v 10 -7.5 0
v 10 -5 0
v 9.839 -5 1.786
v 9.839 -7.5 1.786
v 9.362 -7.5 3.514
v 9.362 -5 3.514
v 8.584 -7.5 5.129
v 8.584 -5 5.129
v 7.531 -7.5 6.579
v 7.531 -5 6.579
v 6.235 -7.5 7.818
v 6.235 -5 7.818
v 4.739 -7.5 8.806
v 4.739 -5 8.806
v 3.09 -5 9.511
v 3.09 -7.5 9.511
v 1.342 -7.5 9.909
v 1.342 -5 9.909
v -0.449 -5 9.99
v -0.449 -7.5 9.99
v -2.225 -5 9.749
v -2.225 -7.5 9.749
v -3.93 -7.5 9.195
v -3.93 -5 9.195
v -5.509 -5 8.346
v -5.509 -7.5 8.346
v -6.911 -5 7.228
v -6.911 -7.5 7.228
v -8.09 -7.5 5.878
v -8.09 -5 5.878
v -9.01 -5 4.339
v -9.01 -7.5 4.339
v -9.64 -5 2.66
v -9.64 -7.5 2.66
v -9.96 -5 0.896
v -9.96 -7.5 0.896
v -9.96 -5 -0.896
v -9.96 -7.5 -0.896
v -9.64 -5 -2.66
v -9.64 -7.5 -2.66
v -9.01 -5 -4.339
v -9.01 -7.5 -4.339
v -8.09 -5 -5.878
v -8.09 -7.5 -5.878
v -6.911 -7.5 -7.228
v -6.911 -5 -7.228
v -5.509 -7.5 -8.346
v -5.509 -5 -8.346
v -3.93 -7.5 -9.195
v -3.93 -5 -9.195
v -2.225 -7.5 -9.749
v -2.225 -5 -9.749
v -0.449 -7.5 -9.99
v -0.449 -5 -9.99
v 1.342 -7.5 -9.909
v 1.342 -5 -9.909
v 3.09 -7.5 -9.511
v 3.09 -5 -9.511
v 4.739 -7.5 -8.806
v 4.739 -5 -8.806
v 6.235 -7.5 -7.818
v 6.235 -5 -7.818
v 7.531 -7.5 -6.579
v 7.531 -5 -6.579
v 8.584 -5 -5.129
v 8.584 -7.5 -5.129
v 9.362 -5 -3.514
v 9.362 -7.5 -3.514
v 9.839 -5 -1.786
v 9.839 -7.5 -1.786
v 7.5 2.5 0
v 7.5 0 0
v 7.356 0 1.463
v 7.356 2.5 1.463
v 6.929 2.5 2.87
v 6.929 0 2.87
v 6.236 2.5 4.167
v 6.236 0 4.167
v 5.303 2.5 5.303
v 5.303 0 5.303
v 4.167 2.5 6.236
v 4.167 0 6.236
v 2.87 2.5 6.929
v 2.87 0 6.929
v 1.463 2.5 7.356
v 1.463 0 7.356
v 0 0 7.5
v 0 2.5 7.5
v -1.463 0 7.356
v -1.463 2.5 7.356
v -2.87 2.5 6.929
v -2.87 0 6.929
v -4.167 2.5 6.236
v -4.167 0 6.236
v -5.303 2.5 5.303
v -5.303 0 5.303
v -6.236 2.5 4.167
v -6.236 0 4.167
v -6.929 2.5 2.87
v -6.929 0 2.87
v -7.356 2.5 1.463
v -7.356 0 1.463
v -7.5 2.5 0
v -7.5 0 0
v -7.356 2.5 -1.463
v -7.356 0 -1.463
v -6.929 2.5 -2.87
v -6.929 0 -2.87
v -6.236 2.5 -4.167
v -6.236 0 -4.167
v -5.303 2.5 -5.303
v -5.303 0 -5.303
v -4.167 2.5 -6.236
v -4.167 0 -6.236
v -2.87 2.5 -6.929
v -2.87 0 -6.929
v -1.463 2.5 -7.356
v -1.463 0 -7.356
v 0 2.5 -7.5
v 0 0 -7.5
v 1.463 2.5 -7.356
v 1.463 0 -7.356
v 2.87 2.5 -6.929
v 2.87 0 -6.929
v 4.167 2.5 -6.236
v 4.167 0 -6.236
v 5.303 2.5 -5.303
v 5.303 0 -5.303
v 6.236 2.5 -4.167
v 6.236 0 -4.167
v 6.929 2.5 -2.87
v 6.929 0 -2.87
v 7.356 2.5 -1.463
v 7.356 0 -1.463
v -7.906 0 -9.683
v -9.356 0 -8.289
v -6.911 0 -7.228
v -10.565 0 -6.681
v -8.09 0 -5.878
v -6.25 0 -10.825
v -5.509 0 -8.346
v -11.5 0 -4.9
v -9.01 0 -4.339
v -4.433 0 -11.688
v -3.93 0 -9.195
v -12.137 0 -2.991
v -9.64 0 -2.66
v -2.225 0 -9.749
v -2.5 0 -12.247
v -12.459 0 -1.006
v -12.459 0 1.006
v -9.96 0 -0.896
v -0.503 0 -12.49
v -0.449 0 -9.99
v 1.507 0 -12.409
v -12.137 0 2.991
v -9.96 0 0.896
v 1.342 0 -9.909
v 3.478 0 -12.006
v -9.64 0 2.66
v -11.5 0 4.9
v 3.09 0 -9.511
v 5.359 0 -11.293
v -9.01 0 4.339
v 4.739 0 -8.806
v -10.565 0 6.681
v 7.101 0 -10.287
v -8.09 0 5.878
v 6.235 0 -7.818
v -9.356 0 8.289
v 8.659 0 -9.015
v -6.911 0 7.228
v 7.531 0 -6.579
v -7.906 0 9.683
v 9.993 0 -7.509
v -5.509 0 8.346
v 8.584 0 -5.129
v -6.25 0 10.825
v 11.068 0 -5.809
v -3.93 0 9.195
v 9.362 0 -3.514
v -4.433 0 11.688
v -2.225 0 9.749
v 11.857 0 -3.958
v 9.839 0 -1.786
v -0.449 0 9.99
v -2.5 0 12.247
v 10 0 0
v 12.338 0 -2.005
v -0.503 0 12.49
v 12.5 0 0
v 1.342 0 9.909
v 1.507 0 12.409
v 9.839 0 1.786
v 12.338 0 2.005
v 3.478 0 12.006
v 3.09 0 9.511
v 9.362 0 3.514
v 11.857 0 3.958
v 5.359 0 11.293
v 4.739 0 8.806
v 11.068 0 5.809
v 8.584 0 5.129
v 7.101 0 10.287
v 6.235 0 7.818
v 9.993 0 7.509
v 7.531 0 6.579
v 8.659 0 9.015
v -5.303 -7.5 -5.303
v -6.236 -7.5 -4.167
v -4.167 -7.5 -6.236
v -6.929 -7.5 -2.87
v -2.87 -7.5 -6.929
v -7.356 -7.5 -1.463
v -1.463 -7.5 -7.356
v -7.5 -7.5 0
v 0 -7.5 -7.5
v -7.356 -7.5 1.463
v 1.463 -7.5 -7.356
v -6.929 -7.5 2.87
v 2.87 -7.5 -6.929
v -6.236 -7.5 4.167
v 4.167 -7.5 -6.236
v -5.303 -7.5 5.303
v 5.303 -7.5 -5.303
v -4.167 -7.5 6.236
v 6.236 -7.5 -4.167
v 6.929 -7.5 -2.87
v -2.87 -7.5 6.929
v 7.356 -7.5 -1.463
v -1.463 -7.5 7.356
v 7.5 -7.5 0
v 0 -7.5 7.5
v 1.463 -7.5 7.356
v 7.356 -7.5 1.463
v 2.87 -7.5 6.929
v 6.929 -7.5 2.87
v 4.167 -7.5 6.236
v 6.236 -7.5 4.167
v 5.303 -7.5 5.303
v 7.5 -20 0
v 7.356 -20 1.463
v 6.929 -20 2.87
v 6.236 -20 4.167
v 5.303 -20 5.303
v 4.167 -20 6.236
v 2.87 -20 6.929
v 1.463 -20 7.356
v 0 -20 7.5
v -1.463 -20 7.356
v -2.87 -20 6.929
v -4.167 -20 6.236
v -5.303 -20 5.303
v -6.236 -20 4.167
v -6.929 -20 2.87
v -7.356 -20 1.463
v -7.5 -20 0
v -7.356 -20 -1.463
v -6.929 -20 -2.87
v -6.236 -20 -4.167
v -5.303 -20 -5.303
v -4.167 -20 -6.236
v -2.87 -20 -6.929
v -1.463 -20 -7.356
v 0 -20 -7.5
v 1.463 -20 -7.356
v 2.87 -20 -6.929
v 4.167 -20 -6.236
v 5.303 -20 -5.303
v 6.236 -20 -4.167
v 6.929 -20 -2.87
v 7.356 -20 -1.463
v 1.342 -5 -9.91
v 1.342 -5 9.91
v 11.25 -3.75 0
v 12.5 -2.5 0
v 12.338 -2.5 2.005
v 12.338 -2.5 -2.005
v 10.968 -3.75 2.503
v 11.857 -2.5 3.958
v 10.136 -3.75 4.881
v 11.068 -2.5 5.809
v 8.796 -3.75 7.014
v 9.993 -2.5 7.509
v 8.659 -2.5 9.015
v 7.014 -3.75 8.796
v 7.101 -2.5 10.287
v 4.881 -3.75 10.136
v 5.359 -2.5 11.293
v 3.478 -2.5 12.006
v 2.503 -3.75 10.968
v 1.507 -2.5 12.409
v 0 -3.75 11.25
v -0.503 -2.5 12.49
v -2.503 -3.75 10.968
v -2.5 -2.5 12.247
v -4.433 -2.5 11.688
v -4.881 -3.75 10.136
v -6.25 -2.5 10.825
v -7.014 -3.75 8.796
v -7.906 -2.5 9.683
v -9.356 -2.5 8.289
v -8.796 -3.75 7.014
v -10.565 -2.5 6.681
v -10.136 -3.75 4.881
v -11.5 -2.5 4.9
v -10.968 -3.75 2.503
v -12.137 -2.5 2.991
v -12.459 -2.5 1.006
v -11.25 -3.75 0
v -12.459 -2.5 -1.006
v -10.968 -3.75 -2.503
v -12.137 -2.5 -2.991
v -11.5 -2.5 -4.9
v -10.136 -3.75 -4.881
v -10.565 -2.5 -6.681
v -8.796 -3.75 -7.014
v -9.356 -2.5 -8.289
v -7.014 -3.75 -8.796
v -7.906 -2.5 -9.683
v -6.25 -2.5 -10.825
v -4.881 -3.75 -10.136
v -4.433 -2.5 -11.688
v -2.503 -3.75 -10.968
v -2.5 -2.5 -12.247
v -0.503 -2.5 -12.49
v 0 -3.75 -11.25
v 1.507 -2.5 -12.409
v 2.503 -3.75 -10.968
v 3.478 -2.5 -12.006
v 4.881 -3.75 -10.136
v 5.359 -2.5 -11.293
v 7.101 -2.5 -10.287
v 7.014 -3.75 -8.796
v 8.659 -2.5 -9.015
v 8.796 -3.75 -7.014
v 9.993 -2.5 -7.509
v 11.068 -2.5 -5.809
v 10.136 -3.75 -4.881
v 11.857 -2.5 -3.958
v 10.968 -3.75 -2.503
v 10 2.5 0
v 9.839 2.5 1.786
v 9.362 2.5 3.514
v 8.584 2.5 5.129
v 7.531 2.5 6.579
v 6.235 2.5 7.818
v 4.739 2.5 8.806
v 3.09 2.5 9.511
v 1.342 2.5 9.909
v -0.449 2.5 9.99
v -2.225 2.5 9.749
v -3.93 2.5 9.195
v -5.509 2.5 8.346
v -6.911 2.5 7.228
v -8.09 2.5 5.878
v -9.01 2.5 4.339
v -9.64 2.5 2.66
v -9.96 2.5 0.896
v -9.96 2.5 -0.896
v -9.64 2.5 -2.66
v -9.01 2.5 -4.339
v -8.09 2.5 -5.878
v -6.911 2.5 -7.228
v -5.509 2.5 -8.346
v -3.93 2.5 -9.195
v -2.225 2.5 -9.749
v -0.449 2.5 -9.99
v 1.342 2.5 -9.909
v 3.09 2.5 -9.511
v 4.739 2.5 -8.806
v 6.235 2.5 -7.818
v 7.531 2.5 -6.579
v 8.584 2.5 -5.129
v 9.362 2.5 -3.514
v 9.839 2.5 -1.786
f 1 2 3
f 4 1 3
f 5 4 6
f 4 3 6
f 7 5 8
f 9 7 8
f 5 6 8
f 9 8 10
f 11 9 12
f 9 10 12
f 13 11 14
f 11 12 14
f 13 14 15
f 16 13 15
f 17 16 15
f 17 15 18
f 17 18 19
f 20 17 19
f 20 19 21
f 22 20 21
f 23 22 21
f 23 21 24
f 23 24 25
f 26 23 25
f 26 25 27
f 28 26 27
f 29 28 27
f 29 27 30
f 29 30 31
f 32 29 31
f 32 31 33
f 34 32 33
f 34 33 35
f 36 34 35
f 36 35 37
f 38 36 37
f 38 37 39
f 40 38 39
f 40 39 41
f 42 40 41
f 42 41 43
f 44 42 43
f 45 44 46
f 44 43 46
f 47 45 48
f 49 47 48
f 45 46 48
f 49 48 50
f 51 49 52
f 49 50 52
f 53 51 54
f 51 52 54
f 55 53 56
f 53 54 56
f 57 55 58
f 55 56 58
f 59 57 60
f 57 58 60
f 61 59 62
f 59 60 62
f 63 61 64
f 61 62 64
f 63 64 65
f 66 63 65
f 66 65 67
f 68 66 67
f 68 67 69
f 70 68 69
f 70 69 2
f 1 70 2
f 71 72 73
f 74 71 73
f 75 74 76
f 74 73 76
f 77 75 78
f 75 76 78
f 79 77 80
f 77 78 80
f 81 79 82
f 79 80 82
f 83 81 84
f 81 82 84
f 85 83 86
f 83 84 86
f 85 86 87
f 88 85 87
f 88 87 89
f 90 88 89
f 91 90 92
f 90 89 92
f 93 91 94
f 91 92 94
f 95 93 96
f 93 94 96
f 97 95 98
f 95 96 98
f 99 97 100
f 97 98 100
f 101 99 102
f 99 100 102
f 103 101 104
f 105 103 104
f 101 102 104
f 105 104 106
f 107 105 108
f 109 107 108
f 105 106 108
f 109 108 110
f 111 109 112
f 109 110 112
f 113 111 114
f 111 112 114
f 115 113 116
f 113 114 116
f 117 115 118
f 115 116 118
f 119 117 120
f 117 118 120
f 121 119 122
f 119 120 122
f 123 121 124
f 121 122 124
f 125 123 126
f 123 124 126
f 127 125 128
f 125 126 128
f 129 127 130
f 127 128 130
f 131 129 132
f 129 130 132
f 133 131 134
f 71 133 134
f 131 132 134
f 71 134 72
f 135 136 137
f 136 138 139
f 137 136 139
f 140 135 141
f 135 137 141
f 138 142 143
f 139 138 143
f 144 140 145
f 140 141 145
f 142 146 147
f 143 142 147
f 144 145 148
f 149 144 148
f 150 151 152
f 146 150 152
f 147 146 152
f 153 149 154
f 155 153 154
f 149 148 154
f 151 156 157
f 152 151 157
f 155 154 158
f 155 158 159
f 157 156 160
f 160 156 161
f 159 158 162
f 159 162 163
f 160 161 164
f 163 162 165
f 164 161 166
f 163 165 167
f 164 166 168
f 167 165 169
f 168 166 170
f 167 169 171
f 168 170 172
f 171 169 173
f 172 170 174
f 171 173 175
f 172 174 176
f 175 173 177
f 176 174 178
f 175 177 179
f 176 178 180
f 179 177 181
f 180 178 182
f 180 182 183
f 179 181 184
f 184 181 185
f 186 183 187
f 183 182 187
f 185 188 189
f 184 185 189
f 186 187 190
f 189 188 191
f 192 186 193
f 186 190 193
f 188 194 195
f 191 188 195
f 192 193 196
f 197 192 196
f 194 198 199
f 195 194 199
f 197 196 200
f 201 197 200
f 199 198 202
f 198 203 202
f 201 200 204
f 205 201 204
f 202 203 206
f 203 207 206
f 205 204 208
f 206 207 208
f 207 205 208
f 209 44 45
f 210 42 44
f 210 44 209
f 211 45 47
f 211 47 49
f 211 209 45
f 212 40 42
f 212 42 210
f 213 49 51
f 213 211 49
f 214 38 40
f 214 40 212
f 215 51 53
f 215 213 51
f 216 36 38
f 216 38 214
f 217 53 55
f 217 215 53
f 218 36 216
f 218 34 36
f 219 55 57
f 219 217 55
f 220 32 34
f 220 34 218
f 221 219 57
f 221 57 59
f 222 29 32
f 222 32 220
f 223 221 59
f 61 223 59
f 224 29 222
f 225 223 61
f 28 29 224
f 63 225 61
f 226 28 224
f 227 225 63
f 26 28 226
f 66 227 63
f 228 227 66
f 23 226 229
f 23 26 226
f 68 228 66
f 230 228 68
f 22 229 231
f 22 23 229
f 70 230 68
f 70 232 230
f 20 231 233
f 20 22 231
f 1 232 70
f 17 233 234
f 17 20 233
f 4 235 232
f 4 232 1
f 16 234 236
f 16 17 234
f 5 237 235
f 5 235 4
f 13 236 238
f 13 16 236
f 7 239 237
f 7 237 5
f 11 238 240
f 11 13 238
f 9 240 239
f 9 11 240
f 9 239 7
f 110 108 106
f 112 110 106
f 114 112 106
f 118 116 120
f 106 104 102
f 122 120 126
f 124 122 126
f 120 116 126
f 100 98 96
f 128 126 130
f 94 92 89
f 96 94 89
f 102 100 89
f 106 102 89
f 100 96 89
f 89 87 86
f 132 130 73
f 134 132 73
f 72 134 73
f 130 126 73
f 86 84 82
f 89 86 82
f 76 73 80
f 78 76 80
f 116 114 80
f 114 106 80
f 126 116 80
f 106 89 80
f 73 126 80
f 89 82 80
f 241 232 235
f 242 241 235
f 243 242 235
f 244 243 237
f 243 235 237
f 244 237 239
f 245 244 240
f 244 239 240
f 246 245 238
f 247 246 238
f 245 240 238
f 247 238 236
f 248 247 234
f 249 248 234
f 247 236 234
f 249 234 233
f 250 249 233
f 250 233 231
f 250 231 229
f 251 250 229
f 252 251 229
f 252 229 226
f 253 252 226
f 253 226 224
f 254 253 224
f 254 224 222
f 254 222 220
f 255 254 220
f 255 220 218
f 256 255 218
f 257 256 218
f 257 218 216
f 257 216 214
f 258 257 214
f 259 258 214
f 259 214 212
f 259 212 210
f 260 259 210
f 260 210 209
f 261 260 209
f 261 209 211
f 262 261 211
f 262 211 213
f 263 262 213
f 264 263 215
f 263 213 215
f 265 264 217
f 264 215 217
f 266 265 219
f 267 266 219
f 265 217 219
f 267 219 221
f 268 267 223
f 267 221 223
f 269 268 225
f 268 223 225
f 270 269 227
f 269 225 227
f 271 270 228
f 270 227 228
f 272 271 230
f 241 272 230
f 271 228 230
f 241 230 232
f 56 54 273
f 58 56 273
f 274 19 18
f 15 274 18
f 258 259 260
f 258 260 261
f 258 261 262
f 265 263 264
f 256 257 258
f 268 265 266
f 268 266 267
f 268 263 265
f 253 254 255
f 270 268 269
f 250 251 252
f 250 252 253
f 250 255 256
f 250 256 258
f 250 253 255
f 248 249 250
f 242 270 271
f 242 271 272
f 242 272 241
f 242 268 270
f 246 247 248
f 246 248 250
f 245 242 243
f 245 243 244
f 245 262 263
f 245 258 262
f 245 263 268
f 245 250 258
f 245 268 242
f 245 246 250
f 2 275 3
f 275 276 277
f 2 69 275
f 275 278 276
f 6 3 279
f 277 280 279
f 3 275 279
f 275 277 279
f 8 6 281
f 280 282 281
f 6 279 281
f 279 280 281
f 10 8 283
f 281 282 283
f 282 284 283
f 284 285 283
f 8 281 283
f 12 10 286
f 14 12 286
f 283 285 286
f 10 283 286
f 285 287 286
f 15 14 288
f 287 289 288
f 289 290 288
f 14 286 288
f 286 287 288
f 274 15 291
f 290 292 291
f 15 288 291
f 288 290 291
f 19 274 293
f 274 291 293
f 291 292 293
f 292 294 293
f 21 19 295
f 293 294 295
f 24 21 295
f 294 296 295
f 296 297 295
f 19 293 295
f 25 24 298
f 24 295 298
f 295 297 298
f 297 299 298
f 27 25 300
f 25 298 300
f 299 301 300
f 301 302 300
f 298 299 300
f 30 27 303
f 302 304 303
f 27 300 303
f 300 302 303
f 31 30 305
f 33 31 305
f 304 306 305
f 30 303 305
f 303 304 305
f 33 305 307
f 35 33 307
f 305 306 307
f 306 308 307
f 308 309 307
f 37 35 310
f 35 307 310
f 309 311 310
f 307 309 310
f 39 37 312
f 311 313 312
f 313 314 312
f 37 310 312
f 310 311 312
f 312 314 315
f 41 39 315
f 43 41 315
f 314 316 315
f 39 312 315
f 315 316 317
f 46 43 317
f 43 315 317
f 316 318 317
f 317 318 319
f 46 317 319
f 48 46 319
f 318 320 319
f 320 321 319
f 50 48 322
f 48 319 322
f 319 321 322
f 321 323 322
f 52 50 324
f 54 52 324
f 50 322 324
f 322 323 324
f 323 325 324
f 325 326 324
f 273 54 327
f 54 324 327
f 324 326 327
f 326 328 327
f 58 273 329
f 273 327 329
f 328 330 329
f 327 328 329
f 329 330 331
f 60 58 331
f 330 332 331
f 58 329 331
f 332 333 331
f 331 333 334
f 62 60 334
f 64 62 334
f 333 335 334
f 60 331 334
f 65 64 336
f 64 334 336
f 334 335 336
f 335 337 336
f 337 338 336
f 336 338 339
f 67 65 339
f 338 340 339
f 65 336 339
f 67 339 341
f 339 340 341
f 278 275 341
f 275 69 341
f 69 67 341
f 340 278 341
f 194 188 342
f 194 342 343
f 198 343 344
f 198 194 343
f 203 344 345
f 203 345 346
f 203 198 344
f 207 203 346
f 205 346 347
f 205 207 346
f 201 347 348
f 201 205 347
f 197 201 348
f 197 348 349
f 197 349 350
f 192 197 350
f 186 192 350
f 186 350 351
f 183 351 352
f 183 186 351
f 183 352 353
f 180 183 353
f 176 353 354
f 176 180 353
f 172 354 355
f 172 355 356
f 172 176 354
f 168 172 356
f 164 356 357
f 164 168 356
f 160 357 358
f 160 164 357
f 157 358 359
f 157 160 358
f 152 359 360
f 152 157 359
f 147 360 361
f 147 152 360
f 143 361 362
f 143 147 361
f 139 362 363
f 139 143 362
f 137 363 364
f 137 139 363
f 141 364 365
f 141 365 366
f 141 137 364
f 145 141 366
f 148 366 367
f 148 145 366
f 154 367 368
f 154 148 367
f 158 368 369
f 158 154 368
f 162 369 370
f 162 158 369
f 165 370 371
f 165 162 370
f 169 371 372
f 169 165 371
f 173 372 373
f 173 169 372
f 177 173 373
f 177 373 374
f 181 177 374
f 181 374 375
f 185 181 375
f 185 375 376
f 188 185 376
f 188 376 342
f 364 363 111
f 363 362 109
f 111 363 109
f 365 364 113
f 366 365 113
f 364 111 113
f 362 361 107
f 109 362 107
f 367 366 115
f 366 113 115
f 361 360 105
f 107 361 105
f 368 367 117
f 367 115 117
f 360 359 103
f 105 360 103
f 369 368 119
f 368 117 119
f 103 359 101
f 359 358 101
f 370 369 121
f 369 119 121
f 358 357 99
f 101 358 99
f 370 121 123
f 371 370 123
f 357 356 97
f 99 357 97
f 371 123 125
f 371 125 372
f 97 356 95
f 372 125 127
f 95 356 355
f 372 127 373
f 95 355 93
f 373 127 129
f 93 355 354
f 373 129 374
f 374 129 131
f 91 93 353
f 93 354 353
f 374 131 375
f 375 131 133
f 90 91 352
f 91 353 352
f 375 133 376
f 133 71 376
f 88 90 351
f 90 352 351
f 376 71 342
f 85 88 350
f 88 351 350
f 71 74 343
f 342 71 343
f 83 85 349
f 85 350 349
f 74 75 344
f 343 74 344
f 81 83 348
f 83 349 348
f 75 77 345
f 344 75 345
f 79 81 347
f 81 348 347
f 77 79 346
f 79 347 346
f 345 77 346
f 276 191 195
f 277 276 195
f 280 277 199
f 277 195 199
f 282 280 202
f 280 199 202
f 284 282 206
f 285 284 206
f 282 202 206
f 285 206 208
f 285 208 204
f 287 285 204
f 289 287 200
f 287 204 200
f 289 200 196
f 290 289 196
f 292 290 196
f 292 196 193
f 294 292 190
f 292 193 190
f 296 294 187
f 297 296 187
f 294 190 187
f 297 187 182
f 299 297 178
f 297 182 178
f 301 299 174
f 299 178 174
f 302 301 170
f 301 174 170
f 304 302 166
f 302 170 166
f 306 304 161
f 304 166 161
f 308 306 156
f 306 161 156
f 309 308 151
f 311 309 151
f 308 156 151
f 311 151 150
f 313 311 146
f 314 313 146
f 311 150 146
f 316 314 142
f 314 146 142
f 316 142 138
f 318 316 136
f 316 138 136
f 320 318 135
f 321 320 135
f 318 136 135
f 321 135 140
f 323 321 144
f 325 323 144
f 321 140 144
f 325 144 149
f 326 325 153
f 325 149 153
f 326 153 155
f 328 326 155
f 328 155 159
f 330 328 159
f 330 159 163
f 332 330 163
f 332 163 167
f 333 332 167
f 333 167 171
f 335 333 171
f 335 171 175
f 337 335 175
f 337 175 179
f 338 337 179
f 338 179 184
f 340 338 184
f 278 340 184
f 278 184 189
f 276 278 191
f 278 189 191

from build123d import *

# Parameters (mm, degrees)
F0_R        = 10
F0_R_2      = 7.5
F1_DEPTH    = 2.5
F1_FACE_R   = 10
F1_FACE_R_2 = 7.5
F2_R        = 12.5
F2_R_2      = 10
F3_DEPTH    = 5
F4_R        = 10
F4_R_2      = 7.5
F5_DEPTH    = 2.5
F7_SIZE     = 2.49999
F8_R        = 5
F6_R        = 7.5
F9_DEPTH    = 20


# Not quite as in the source:
# - a fillet or chamfer is up to 0.001 mm smaller than in the source, because OpenCascade refuses the exact size


with BuildPart() as f1:
    # F0 (on Front) → F1 (new body)
    with BuildSketch(Plane.XZ):
        Circle(F0_R)
        Circle(F0_R_2, mode=Mode.SUBTRACT)
    extrude(amount=F1_DEPTH)

    # F1_face (on face) + F2 (on Front) → F3 (join)
    with BuildSketch(Plane.XZ.offset(2.5)):
        Circle(F1_FACE_R)
        Circle(F1_FACE_R_2, mode=Mode.SUBTRACT)
    with BuildSketch(Plane.XZ):
        Circle(F2_R)
        Circle(F2_R_2, mode=Mode.SUBTRACT)
    extrude(amount=F3_DEPTH)

    # F4 (on Front) → F5 (join)
    with BuildSketch(Plane.XZ):
        Circle(F4_R)
        Circle(F4_R_2, mode=Mode.SUBTRACT)
    extrude(amount=-F5_DEPTH)

    # F7 (size 2.5 in the source; OpenCascade refuses exactly that, so slightly less here)
    f7_edges = [f1.edges().sort_by_distance(p)[0] for p in [
        (-12.5, -5, 0),
    ]]
    chamfer(f7_edges, length=F7_SIZE)

    # F8 (on Front) + F6 (on Front) → F9 (join)
    with BuildSketch(Plane.XZ):
        Circle(F8_R)
    with BuildSketch(Plane.XZ):
        Circle(F6_R)
    extrude(amount=F9_DEPTH)


solid = f1.part
